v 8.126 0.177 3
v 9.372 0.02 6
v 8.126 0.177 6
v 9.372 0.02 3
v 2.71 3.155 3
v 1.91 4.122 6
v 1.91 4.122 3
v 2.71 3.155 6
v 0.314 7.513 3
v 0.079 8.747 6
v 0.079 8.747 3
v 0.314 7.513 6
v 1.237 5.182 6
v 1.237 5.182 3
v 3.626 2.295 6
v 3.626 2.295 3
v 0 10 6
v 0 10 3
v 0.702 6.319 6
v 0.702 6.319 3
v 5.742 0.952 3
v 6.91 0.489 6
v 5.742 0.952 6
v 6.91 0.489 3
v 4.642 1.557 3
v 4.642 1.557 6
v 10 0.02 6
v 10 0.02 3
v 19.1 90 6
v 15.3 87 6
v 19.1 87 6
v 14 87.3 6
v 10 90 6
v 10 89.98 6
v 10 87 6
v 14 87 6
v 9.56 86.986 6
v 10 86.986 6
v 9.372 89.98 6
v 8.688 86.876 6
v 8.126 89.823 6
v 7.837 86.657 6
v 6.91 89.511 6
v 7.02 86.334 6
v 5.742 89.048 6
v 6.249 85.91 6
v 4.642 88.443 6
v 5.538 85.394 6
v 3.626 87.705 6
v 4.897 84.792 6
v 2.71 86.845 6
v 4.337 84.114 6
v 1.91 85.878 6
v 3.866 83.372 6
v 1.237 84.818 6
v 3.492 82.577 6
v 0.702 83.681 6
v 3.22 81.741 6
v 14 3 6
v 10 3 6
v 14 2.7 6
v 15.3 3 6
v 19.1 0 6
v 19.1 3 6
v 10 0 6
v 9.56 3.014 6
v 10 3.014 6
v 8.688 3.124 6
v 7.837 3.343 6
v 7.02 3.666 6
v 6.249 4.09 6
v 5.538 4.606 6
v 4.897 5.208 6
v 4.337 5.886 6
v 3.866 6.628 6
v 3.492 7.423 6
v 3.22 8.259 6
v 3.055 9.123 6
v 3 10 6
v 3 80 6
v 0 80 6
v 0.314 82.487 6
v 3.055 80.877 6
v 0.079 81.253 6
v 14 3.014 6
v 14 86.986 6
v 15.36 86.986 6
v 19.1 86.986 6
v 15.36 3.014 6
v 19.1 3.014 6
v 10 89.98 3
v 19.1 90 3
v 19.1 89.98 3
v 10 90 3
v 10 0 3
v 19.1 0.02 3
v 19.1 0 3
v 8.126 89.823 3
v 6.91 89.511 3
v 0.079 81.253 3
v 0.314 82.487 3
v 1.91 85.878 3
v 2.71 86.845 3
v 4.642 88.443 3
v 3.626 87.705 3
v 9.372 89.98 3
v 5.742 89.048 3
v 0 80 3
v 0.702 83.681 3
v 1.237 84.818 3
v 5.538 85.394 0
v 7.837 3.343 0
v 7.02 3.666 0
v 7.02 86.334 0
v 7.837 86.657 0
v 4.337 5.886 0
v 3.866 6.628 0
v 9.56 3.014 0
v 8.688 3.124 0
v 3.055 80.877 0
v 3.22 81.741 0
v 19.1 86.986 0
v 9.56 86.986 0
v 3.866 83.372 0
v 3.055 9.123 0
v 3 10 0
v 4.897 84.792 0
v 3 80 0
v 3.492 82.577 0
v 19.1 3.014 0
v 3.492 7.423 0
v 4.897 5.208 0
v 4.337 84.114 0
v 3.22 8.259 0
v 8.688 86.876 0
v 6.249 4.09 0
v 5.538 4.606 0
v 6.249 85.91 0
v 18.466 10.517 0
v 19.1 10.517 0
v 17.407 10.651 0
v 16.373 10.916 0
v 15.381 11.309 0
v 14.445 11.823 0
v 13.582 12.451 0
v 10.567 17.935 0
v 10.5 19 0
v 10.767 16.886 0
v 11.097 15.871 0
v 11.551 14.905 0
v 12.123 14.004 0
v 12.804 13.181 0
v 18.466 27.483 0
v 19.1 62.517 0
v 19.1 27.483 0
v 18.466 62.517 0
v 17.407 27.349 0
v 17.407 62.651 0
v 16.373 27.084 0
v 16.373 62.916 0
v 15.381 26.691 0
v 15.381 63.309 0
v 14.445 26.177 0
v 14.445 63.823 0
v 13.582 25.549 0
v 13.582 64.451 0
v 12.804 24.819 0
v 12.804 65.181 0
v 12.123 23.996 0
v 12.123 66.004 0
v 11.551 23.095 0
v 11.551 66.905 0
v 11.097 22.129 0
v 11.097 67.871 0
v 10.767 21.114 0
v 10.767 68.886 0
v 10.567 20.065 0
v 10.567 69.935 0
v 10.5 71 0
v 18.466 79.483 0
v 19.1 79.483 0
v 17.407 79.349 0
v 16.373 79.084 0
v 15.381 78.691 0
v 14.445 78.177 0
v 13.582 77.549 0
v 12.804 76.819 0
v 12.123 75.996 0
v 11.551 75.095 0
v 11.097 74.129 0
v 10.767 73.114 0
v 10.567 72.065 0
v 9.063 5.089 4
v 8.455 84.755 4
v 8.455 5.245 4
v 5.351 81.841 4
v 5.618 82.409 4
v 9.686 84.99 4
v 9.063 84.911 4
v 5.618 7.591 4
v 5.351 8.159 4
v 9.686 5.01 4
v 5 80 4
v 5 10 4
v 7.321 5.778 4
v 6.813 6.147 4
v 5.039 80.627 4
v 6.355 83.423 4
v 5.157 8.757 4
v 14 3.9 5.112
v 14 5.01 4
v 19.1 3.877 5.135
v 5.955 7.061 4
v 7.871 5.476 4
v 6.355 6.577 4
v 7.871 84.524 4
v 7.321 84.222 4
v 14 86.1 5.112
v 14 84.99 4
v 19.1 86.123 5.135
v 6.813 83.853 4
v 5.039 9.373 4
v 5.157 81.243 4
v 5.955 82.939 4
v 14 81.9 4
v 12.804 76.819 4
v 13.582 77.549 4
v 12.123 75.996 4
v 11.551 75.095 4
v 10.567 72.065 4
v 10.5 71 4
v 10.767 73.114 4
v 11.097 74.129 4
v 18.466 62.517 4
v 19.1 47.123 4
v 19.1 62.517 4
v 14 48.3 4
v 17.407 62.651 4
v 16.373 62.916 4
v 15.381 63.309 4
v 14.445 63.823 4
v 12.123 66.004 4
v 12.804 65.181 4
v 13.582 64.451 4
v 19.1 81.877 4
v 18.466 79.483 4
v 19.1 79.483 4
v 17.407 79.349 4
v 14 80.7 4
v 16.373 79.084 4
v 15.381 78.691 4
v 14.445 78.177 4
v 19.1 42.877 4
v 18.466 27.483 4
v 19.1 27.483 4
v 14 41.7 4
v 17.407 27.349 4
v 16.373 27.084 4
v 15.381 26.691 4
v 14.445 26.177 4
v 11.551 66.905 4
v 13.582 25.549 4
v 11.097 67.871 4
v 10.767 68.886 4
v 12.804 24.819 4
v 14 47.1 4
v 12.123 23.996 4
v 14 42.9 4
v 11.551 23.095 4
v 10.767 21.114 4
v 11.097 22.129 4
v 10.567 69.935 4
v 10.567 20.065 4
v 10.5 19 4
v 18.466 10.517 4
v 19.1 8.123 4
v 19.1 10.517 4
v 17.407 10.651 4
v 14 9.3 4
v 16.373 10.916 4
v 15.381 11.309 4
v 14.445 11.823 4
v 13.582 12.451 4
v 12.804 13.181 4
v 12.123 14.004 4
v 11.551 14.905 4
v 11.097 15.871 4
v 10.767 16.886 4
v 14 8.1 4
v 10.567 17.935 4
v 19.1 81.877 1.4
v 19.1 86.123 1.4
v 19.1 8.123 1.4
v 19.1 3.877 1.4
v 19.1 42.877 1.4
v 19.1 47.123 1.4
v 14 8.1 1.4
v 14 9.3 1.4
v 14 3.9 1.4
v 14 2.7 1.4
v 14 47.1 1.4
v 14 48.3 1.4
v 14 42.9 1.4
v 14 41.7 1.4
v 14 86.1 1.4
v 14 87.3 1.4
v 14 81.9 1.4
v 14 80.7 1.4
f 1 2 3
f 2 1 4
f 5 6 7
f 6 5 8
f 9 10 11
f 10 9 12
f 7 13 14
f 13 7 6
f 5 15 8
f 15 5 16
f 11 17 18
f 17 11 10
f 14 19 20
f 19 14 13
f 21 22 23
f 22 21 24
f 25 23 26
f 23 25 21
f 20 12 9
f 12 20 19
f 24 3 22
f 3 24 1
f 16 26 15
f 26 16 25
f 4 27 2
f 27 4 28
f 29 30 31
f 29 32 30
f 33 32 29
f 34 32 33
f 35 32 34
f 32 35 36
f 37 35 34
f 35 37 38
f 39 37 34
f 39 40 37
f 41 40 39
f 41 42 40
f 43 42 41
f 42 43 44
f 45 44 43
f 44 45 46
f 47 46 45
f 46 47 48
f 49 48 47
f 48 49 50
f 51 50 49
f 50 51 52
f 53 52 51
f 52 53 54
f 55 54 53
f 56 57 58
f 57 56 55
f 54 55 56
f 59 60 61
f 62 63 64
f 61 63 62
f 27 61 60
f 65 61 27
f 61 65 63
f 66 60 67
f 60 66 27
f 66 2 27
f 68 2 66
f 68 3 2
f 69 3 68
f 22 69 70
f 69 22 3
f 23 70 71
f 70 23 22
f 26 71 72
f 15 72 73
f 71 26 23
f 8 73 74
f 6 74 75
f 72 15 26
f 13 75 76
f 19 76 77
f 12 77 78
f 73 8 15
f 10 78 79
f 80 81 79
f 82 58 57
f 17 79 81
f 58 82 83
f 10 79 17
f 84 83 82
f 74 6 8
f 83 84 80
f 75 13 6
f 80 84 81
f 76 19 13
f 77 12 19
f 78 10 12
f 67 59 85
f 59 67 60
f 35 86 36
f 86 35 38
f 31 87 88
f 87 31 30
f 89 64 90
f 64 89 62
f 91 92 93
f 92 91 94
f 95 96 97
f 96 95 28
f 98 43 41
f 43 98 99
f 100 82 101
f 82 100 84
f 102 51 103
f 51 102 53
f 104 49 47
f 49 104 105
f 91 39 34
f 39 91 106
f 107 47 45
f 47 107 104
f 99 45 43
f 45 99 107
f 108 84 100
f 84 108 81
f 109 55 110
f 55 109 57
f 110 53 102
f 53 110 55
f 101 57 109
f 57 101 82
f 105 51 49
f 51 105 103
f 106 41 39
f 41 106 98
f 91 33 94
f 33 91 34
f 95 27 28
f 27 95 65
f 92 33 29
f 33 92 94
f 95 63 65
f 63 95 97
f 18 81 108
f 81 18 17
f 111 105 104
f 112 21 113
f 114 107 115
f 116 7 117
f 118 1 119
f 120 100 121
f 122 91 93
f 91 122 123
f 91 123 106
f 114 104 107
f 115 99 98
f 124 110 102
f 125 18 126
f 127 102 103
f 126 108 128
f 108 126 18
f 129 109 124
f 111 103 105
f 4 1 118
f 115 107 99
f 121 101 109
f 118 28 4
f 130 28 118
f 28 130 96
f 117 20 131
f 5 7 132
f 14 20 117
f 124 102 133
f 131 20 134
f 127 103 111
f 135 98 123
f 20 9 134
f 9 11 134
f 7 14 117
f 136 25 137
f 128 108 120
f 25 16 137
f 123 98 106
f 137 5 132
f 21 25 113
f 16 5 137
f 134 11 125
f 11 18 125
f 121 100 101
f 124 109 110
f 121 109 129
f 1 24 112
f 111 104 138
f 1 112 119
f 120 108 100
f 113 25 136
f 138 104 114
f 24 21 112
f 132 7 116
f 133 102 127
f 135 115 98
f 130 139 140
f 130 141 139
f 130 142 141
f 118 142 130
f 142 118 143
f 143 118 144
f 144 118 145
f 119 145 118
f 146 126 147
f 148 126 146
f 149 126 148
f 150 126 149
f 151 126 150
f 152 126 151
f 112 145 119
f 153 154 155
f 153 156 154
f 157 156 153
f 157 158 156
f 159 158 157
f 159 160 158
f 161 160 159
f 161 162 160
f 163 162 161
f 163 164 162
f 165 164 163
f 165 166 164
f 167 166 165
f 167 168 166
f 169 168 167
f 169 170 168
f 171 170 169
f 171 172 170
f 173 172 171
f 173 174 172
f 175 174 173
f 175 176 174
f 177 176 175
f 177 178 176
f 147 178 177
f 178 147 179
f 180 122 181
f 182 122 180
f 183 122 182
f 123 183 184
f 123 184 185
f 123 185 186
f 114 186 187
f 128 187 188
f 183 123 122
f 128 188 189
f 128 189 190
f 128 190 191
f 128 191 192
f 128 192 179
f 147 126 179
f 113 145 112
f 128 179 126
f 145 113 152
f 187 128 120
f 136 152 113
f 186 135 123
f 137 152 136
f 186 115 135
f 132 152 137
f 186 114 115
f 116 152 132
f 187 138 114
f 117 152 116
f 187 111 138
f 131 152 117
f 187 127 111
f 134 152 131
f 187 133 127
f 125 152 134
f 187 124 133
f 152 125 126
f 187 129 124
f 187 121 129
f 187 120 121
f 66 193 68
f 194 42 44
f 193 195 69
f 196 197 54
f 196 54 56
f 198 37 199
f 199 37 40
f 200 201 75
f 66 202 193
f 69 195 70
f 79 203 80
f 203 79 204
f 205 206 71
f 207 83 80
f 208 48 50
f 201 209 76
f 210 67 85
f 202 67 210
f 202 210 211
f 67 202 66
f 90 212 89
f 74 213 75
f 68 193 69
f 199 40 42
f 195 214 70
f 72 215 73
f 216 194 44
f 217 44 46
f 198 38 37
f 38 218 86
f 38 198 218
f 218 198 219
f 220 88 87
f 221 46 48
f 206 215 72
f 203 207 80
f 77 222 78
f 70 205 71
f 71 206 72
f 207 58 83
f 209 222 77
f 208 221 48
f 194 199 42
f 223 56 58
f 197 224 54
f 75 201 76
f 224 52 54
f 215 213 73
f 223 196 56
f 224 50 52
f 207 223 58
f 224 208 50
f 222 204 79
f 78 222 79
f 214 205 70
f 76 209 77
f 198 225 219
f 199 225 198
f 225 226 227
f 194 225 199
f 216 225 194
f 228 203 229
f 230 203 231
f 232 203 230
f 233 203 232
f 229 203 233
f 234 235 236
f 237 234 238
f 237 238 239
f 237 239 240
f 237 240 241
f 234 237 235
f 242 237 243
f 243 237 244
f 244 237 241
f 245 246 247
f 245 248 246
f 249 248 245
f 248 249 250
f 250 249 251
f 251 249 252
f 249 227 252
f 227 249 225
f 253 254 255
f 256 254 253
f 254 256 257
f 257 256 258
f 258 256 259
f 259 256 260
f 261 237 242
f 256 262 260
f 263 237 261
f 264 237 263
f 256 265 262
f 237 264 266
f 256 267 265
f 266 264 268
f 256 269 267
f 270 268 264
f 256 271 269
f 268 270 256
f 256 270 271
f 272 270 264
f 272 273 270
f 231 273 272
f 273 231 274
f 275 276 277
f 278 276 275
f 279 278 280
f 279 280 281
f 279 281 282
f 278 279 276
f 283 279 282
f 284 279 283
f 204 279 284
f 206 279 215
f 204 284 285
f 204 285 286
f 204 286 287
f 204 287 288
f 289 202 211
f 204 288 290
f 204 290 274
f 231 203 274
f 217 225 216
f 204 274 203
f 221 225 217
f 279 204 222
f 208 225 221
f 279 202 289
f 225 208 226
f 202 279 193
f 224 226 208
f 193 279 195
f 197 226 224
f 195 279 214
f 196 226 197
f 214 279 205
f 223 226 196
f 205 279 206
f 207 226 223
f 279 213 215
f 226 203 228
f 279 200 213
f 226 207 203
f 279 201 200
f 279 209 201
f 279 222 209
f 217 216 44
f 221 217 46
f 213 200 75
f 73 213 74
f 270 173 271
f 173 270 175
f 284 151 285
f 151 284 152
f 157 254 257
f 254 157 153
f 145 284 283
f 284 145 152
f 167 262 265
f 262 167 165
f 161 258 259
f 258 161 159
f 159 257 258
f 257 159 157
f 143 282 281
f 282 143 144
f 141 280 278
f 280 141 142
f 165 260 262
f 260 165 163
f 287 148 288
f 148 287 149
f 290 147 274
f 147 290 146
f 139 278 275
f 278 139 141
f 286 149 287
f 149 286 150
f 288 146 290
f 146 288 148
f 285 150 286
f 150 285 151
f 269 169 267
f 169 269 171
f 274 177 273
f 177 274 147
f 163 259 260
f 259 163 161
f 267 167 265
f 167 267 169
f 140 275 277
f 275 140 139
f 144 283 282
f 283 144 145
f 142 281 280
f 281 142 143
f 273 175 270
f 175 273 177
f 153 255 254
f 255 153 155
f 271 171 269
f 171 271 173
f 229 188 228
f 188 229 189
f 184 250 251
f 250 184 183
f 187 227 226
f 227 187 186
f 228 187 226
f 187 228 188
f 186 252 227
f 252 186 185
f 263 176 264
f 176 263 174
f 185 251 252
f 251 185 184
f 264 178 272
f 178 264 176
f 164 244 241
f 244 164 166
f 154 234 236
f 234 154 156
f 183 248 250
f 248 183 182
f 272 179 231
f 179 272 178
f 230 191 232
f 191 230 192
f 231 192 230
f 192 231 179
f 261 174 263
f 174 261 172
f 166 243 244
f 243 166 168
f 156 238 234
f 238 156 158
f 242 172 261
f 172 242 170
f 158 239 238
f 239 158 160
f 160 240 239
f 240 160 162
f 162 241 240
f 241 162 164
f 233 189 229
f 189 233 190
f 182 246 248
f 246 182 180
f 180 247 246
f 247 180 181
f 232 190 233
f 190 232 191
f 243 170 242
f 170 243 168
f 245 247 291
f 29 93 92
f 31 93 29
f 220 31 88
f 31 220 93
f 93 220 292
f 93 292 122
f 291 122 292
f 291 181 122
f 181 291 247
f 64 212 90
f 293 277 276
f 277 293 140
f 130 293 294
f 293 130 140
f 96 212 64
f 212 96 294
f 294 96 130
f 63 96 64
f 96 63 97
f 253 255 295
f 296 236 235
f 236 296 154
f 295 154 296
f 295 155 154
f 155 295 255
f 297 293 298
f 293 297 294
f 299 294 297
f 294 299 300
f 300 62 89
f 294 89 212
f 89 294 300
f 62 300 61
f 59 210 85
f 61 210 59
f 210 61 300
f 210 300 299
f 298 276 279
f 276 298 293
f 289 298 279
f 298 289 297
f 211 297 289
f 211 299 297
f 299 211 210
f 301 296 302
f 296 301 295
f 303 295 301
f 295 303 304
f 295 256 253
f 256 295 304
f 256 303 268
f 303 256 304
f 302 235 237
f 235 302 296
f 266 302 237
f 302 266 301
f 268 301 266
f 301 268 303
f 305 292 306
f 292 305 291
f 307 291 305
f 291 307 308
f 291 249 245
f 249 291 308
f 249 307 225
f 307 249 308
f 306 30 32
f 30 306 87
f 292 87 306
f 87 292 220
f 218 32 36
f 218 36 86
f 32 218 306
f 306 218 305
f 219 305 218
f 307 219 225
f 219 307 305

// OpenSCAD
// file: dining_room_config.scad
use <./_cfg.scad>

// Dining Room Configuration Functions
function get_h() = 6;
function get_width() = 38;
function get_length() = 90;
function get_diameter() = 17;
function get_distance() = 52;
function get_nutDistance() = 6;
function get_separation() = 10;
function get_offset_l() = 0;
function get_offset_r() = 0;
// file: _cfg.scad
// Global configuration functions
function get_fn() = 50;
function get_darft() = false;
// file: base.scad
module base(h, width, length, diameter, distance, offset_l=0, offset_r=0, fn) {
    corner_radius=10;

    difference() {
        union() {
            difference() {
                _base_plate_shape(corner_radius, h, width, length, fn);
                translate([3,3,h-2]) {
                    offset=3;
                    _base_plate_shape(corner_radius-offset, h-2, width-offset*2, length-offset*2, fn);
                }
            }
        }

        translate([width/2, length/2-distance/2, -.1]) {
            translate([offset_l, 0, 0])
            cylinder(d=diameter, h=h+.2, center=false, $fn=fn);
            translate([offset_r, distance, 0]) {
                cylinder(d=diameter, h=h+.2, center=false, $fn=fn);
            }
        }
    }
}

module rounded_top_only(corner_radius, h, width, length, fn) {
    minkowski() {
        _base_plate_shape(corner_radius, h - corner_radius, width, length, fn);
        translate([0, 0, corner_radius]) cylinder(r=corner_radius/2, h=0.001, $fn=fn);
    }
}

module _base_plate_shape(corner_radius, h, width, length, fn) {
    hs=h/2;
    hn=h-hs;

    translate([0, 0, hs])

    union() {
        translate([corner_radius, 0, 0])
            cube([width - corner_radius * 2, length, hn], center=false);

        translate([0, corner_radius, 0])
            cube([width, length - corner_radius * 2, hn], center=false);

        for (x = [corner_radius, width - corner_radius])
        for (y = [corner_radius, length - corner_radius])
        translate([x, y, 0])
            cylinder(d = corner_radius * 2, h = hn, center = false, $fn = fn);

        // -------

        hull() {
            for (x = [corner_radius, width - corner_radius])
            for (y = [corner_radius, length - corner_radius])
            translate([x, y, 0])
                translate([0, 0, -hs])
                    cylinder(r1=corner_radius-hs, r2=corner_radius, h = hs, center = false, $fn = fn);
        }
    }
}

module nut(h,extend=0) {
    nut_height=h;
    nut_width=5+extend;
    nut_length=4+extend;
    nut_length_=1+extend;
    rotate([0,0,90]) {
        translate([-nut_length/2,0,0]) {
            linear_extrude(height=nut_height)
                polygon(points=[[0,0], [-nut_length_,nut_width], [0,nut_width]]);

            translate([nut_length,0,0]) {
                linear_extrude(height=nut_height)
                    polygon(points=[[0,0], [nut_length_,nut_width], [0,nut_width]]);
            }

            cube([nut_length, nut_width, nut_height], center=false);
        }
    }
}

module both(h, width, length, diameter, distance, nutDistance, separation, offset_l=0, offset_r=0, fn) {
    left(h, width, length, diameter, distance, nutDistance, offset_l, offset_r, fn);

    translate([-separation, 0, 0])
        right(h, width, length, diameter, distance, nutDistance, offset_l, offset_r, fn);
}

module left(h, width, length, diameter, distance, nutDistance, offset_l=0, offset_r=0, fn) {
    union() {
        translate([0, 0, 0]) {
            difference() {
                base(h, width, length, diameter, distance, offset_l, offset_r, fn);
                translate([-.1, -.1, -.1]) {
                    cube([width / 2, length + .2, h + .2], center = false);
                }
            }
        }

        translate([0.2,0,2])
            translate([width / 2, 0, 0]) {
                translate([0, nutDistance, 0]) {
                    nut(h - 4);
                }
                translate([0, length / 2, 0]) {
                    nut(h - 4);
                }
                translate([0, length - nutDistance, 0]) {
                    nut(h - 4);
                }
            }
    }
}

module right(h, width, length, diameter, distance, nutDistance, offset_l=0, offset_r=0, fn) {
    difference() {
        union() {
            difference() {
                base(h, width, length, diameter, distance, offset_l, offset_r, fn);
                translate([width / 2 + .1, -.1, -.1]) {
                    cube([width / 2, length + .2, h + .2], center = false);
                }
            }
        }

        translate([0.2,0,1.5])
            translate([width / 2 , 0, -.1]) {
                translate([0, nutDistance, 0]) {
                    nut(h - 1.3, extend = .2);
                }
                translate([0, length / 2, 0]) {
                    nut(h - 1.3, extend = .2);
                }
                translate([0, length - nutDistance, 0]) {
                    nut(h - 1.3, extend =  .2);
                }
            }
    }
}
// main file
use <./base.scad>
use <./_cfg.scad>
use <./dining_room_config.scad>

right(
    h=get_h(),
    width=get_width(),
    length=get_length(),
    diameter=get_diameter(),
    distance=get_distance(),
    nutDistance=get_nutDistance(),
    offset_l=get_offset_l(),
    offset_r=get_offset_r(),
    fn=get_fn()
);
